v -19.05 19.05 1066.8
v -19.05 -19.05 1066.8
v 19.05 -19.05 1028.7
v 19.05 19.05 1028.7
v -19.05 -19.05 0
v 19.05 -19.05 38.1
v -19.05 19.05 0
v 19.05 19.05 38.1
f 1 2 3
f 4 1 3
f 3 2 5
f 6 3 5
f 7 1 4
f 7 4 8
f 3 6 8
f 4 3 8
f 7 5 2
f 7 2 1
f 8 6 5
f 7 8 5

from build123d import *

# Parameters (mm, degrees)
F0_W     = 38.1
F0_H     = 38.1
F1_DEPTH = 1066.8
F3_DEPTH = 38.1
F4_DEPTH = 38.1


with BuildPart() as f1:
    # F0 (on Top) → F1 (new body)
    with BuildSketch(Plane.XY):
        Rectangle(F0_W, F0_H)
    extrude(amount=F1_DEPTH)

    # F2 (on face) → F3 (cut)
    with BuildSketch(Plane.XZ.offset(19.05)):
        Polygon((19.05, 1066.8), (-19.05, 1066.8), (19.05, 1028.7), align=None)
    extrude(amount=-F3_DEPTH, mode=Mode.SUBTRACT)

    # F2 (on face) → F4 (cut)
    with BuildSketch(Plane.XZ.offset(19.05)):
        Polygon((19.05, 38.1), (-19.05, 0), (19.05, 0), align=None)
    extrude(amount=-F4_DEPTH, mode=Mode.SUBTRACT)


solid = f1.part
